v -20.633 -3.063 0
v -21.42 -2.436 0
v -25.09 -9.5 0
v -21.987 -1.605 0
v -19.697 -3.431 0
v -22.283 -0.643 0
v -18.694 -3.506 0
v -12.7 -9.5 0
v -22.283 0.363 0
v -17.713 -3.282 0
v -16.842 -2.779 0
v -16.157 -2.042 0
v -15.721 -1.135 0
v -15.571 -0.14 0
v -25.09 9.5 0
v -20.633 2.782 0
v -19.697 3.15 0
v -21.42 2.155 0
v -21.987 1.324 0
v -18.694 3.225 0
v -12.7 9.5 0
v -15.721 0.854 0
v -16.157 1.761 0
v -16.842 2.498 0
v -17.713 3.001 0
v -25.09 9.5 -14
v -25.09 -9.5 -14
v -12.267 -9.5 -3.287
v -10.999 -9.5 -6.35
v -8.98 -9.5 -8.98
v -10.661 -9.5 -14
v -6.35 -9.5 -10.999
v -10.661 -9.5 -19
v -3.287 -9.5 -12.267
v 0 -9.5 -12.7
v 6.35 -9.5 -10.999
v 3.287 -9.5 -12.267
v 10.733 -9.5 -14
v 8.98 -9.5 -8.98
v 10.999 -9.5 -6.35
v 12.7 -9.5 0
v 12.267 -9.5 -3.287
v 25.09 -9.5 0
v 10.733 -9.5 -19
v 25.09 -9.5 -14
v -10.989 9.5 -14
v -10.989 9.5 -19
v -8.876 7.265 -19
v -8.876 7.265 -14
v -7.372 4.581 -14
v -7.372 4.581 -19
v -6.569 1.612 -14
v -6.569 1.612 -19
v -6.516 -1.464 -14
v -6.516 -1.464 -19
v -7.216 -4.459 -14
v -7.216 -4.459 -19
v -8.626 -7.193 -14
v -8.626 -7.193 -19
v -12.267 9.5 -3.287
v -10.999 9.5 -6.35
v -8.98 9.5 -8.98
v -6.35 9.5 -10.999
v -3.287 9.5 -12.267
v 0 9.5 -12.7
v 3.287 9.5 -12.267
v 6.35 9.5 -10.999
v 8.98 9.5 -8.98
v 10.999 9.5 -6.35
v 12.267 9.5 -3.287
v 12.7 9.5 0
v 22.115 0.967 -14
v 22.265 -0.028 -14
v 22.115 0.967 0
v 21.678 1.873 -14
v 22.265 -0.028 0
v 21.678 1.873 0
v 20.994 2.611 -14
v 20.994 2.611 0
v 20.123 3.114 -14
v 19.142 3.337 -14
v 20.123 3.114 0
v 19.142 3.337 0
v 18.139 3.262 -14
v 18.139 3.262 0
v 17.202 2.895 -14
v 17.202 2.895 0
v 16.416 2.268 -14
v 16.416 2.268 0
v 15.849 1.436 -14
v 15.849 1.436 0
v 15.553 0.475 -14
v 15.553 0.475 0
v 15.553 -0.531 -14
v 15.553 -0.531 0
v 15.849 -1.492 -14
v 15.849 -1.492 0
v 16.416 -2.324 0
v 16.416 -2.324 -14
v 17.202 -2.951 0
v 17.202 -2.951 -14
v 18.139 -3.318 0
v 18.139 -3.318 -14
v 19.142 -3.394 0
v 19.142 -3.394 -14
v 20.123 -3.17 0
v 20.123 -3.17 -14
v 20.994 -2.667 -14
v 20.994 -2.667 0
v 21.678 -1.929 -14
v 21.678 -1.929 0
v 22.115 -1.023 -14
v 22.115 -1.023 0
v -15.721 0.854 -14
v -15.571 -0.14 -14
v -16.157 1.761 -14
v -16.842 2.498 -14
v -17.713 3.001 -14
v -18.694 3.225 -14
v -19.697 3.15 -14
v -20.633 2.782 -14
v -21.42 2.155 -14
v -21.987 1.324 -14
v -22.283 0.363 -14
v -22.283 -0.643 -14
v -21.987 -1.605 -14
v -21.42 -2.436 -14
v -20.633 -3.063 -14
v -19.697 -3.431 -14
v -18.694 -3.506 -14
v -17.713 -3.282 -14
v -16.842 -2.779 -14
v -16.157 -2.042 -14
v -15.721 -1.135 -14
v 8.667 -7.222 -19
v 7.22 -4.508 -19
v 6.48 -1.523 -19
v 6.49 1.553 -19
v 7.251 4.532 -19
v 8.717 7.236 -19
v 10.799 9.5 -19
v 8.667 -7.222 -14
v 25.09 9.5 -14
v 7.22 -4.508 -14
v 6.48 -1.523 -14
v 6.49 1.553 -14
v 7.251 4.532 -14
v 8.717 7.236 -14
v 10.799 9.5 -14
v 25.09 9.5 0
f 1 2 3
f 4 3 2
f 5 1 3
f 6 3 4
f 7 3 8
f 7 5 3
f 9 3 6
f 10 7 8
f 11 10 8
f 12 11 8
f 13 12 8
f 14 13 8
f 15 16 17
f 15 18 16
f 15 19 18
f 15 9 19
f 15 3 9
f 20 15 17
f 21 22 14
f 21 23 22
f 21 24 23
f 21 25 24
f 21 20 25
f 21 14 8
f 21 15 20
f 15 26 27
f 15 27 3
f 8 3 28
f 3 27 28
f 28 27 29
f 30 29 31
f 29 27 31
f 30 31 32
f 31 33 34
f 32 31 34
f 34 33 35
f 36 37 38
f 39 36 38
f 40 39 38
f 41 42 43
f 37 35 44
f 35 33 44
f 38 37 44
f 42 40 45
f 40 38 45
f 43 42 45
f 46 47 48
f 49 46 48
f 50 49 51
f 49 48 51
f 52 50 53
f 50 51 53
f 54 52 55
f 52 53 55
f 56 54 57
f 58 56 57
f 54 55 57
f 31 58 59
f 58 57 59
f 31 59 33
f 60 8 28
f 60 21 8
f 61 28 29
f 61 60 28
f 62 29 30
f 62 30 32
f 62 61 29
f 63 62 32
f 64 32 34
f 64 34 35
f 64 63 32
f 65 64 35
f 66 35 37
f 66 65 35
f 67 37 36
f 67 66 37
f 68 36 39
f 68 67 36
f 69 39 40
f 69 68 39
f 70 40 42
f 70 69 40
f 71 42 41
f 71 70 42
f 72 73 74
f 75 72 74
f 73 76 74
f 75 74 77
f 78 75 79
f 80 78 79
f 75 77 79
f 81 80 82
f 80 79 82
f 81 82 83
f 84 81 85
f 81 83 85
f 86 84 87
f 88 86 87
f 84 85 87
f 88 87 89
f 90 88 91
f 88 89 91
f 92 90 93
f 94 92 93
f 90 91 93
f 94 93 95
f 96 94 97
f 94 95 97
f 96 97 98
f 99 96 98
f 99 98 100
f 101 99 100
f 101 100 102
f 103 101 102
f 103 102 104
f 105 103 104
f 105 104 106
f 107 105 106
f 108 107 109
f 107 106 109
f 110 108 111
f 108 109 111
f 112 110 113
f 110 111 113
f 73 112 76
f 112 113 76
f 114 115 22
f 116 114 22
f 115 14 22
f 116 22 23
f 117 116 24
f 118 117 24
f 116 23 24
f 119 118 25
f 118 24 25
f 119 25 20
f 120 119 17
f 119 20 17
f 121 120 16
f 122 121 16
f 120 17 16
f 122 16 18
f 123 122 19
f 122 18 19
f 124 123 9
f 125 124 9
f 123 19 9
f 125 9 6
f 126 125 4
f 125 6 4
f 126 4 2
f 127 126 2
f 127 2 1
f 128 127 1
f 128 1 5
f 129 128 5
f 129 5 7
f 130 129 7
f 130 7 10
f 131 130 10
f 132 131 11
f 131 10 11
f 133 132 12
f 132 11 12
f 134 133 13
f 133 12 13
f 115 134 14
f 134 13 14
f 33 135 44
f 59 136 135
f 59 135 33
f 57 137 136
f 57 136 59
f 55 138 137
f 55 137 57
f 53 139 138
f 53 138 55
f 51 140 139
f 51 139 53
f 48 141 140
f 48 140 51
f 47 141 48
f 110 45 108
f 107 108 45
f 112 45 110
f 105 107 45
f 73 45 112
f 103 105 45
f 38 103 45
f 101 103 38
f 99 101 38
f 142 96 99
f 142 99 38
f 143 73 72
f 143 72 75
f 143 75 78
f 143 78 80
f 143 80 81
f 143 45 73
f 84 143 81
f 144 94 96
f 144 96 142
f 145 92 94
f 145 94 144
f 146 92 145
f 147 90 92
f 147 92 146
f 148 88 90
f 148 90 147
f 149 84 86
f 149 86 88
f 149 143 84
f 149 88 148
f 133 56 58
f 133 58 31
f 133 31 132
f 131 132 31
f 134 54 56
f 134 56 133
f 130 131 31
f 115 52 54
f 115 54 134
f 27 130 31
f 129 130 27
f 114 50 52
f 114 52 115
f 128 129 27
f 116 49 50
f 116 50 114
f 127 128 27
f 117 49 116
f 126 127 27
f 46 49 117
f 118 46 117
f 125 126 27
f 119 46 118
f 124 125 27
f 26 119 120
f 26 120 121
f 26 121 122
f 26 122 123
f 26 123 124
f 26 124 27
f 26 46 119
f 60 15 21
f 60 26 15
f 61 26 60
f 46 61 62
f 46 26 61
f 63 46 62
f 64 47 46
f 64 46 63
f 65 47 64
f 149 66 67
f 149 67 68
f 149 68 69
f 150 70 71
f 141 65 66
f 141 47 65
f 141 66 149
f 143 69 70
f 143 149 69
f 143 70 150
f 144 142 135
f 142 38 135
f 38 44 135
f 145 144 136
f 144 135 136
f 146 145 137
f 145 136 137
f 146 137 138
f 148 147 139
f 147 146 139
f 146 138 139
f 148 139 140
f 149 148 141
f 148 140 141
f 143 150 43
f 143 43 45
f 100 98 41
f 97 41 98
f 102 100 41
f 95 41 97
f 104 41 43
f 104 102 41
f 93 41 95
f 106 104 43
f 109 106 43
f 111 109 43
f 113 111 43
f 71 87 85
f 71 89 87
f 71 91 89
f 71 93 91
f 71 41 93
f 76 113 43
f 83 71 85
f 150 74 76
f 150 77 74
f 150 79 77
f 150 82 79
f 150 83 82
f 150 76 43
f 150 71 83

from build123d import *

# Parameters (mm, degrees)
BOSS_EXTRUDE2_DEPTH                      = 9.5
CBORE_FOR_M12_HEX_HEAD_BOLT2_D           = 6.75
CBORE_FOR_M12_HEX_HEAD_BOLT2_CBORE_D     = 25
CBORE_FOR_M12_HEX_HEAD_BOLT2_CBORE_DEPTH = 5


with BuildPart() as part:
    # Sketch1 → Boss-Extrude2 (new, symmetric)
    with BuildSketch(Plane(origin=(0, 0, 0), x_dir=(1, 0, 0), z_dir=(0, 1, 0))):
        with BuildLine():
            ThreePointArc((-12.7, 0), (0, 12.7), (12.7, 0))
            Line((12.7, 0), (25.09, 0))
            Line((25.09, 0), (25.09, 19))
            Line((25.09, 19), (-25.09, 19))
            Line((-25.09, 19), (-25.09, 0))
            Line((-25.09, 0), (-12.7, 0))
        make_face()
    extrude(amount=BOSS_EXTRUDE2_DEPTH, both=True)

    # CBORE for M12 Hex Head Bolt2 (through all)
    with Locations(Plane(origin=(18.889837659, -0.028068109, -19), x_dir=(-1, 0, 0), z_dir=(0, 0, -1))):
        with Locations((0, 0), (37.835811537, -0.112272438)):
            CounterBoreHole(CBORE_FOR_M12_HEX_HEAD_BOLT2_D / 2, CBORE_FOR_M12_HEX_HEAD_BOLT2_CBORE_D / 2, CBORE_FOR_M12_HEX_HEAD_BOLT2_CBORE_DEPTH)


solid = part.part
